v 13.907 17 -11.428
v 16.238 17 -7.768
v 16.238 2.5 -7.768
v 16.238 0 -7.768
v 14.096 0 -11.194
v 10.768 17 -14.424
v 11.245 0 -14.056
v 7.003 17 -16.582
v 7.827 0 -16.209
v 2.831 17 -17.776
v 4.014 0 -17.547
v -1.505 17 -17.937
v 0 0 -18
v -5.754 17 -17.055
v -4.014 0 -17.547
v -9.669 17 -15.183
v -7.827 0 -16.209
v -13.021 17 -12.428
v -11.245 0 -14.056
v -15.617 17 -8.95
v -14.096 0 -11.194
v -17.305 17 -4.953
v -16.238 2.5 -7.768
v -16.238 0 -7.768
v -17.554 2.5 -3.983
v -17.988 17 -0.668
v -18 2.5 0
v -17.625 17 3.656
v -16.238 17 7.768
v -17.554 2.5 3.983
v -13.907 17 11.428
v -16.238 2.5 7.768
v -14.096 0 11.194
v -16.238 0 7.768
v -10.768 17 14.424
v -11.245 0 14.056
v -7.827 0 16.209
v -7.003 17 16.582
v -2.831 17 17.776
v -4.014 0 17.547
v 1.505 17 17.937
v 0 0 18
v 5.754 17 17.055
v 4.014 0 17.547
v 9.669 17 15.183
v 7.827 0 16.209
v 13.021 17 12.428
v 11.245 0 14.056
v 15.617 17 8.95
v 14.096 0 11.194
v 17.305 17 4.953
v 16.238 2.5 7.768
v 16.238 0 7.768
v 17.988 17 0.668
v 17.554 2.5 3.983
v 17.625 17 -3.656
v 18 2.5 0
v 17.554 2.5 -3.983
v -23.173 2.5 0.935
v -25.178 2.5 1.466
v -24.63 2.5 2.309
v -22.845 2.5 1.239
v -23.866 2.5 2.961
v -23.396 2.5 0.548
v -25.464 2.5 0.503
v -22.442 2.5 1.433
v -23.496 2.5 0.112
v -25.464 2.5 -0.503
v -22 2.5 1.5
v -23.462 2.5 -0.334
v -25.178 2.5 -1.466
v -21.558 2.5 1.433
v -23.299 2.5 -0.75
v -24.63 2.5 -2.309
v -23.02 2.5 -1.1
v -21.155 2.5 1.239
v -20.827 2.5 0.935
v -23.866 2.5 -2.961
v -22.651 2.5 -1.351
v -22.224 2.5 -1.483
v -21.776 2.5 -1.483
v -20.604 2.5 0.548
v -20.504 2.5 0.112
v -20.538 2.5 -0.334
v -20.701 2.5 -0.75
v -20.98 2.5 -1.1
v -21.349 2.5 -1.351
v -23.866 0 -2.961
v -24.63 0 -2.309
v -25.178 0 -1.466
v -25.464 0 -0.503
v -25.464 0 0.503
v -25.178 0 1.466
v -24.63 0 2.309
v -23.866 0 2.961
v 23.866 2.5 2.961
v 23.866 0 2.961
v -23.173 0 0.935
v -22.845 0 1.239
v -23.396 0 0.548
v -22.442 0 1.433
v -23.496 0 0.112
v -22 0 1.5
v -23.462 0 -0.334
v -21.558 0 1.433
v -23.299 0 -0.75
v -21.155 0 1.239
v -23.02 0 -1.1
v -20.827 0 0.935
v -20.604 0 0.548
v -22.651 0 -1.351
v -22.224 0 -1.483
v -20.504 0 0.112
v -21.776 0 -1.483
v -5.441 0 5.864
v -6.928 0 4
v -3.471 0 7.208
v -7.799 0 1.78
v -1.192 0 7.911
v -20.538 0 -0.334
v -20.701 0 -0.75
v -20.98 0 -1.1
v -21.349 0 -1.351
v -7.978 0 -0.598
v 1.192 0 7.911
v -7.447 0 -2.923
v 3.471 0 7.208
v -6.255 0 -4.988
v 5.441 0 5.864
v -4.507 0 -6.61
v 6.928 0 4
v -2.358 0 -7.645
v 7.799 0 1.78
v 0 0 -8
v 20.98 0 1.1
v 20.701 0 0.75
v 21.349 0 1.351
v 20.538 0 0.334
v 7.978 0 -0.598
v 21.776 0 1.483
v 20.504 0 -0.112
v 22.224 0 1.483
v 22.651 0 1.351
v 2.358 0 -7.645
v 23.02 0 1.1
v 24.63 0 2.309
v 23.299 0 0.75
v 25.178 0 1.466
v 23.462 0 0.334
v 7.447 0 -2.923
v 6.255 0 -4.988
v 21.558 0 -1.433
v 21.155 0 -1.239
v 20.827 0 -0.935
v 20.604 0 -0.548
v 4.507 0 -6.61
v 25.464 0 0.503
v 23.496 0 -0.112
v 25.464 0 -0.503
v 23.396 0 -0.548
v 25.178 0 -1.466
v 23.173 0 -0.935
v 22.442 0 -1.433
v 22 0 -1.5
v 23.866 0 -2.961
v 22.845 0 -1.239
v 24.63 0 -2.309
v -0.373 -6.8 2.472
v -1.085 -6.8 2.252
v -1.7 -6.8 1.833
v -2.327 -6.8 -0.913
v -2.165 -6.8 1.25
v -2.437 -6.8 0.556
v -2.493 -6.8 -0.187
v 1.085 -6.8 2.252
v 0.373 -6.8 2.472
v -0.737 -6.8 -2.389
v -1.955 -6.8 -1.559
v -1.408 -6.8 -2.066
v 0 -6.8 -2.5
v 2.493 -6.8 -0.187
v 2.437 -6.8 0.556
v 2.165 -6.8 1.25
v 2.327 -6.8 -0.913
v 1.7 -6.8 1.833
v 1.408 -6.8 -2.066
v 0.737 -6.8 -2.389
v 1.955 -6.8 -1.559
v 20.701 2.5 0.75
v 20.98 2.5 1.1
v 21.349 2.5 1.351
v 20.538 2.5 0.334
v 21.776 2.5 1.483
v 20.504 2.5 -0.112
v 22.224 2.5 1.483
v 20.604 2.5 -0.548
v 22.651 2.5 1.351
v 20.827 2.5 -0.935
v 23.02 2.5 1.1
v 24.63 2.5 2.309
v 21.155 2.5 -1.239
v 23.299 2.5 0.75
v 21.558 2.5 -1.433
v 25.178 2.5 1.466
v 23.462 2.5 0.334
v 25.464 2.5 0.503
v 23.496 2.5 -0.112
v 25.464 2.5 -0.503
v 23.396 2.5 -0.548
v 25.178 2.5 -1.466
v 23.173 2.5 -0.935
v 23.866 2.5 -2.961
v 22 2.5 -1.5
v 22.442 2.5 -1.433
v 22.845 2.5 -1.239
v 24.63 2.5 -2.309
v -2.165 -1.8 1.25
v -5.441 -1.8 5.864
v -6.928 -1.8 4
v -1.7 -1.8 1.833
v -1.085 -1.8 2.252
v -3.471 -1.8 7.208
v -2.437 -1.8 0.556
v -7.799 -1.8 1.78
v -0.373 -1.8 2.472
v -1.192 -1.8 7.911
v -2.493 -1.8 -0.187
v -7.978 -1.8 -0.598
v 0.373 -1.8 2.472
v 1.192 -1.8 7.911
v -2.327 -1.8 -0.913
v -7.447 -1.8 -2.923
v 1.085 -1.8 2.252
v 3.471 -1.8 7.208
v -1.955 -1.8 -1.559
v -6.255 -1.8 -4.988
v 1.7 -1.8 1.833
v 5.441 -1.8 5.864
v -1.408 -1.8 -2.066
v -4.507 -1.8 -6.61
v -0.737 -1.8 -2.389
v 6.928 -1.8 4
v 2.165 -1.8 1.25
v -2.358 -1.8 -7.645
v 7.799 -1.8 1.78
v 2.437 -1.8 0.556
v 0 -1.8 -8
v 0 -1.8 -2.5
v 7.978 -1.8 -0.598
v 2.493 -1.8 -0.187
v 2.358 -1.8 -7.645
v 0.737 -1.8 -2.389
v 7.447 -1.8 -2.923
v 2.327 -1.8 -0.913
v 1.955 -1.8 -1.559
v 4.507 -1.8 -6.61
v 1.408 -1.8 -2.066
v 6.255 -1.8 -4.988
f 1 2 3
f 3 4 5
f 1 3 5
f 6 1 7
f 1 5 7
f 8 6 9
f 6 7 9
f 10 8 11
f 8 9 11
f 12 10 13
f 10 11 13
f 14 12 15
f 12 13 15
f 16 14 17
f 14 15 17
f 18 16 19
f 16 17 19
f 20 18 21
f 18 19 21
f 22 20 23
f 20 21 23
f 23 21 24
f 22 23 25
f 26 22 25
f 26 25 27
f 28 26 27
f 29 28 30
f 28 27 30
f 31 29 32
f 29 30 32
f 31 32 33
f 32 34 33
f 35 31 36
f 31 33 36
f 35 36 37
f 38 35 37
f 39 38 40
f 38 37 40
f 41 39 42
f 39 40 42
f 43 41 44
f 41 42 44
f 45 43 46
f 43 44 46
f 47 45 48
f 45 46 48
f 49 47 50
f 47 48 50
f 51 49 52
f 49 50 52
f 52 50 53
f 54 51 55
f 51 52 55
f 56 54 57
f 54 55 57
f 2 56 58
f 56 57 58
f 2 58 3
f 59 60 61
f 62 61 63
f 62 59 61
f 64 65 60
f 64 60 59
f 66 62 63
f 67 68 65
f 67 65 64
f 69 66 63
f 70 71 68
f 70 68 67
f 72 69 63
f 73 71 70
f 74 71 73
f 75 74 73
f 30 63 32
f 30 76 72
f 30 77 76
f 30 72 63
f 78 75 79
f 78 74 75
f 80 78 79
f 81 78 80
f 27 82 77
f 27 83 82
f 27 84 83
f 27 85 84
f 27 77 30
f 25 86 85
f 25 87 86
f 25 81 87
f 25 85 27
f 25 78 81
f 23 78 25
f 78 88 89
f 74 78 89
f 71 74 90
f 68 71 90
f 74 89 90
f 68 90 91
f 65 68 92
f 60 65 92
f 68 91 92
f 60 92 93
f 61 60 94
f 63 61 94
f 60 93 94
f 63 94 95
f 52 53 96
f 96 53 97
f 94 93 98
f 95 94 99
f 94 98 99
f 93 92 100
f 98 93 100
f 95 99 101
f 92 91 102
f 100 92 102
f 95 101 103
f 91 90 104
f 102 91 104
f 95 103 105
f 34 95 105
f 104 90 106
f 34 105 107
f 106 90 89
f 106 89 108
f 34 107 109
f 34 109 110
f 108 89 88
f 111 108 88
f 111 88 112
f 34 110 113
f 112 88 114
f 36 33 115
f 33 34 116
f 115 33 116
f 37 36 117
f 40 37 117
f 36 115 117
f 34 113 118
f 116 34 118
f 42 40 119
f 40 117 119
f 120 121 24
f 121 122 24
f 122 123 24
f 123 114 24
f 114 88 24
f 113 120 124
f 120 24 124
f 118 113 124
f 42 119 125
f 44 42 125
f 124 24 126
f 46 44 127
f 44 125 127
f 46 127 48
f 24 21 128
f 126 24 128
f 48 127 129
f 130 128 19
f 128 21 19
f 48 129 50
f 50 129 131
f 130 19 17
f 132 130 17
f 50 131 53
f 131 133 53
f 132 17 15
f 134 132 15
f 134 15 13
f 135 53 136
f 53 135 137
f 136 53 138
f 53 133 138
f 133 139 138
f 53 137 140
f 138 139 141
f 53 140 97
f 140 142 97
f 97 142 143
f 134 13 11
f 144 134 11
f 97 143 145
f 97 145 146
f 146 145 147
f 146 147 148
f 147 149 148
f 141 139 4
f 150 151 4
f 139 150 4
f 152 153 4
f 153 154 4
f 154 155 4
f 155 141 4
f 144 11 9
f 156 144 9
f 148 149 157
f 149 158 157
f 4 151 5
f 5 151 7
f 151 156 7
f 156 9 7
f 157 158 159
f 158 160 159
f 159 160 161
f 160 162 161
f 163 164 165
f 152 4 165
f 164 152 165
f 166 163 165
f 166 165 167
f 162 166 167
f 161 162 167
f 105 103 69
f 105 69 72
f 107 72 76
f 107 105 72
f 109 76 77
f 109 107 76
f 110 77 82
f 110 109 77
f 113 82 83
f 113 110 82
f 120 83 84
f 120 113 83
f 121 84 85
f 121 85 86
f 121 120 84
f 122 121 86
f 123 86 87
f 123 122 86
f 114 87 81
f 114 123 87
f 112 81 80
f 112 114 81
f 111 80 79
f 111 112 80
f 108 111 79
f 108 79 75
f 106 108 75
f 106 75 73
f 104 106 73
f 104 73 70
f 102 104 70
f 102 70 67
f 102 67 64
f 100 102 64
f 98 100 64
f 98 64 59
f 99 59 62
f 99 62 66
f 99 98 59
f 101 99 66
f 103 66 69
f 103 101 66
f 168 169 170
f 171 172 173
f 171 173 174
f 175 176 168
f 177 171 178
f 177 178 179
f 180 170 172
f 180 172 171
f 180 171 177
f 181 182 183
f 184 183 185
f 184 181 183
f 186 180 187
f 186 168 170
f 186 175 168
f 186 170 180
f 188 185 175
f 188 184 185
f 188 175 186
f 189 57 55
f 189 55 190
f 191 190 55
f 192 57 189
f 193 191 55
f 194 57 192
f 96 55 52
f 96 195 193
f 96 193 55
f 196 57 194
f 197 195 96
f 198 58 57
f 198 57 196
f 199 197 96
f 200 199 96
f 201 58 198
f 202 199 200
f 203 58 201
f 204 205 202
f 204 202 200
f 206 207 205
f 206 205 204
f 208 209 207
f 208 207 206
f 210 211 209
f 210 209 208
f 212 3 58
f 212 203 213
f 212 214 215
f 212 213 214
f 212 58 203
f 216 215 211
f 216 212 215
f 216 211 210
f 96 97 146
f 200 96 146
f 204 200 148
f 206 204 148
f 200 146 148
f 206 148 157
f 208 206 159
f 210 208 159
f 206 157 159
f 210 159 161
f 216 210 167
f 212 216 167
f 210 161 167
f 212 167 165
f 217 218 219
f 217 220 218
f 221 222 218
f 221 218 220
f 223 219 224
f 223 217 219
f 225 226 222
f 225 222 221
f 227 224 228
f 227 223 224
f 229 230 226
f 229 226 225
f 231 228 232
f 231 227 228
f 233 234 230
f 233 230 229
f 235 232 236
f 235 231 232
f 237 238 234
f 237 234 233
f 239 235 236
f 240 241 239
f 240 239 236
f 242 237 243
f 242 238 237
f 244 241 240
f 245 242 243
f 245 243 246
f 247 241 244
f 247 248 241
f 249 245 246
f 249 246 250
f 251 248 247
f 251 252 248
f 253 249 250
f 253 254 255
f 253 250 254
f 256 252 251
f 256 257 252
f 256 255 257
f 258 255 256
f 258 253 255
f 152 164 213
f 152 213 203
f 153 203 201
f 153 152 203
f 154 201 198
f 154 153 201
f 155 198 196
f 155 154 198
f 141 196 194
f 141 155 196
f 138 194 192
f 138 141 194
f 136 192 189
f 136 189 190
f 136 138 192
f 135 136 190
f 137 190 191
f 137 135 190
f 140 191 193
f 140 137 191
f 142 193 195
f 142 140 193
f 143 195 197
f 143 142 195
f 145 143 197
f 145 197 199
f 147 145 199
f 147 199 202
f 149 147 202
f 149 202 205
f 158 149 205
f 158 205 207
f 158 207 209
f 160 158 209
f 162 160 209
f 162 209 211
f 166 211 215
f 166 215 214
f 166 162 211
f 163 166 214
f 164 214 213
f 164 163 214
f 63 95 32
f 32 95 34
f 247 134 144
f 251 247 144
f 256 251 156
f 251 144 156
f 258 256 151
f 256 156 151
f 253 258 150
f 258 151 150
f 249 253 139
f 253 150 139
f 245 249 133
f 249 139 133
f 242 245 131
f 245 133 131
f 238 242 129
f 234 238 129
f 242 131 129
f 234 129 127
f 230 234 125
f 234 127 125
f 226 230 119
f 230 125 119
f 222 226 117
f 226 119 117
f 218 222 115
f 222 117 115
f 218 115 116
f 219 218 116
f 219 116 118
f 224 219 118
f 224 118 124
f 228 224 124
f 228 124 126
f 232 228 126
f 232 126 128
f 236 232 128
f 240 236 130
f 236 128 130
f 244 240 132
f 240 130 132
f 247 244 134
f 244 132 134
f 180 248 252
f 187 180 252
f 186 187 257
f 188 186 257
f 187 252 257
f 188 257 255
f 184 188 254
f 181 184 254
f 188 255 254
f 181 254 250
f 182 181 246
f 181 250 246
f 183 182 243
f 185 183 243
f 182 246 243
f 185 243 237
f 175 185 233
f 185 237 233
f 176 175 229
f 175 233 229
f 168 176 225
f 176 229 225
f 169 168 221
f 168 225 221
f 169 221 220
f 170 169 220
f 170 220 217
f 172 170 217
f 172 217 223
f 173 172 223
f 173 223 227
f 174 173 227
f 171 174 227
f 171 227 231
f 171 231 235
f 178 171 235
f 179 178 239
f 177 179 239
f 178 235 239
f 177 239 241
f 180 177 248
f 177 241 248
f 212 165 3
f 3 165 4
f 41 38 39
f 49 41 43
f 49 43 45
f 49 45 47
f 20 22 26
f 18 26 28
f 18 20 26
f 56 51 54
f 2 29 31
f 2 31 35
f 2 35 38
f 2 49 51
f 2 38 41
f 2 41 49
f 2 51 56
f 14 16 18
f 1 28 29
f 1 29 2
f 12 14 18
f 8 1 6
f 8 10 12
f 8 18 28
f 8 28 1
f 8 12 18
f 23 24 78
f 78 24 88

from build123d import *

# Parameters (mm, degrees)
SKETCH1_R           = 1.5
BOSS_EXTRUDE1_DEPTH = 2.5
BOSS_EXTRUDE2_START = -2.5
SKETCH2_R           = 18
BOSS_EXTRUDE2_DEPTH = 17
SKETCH3_R           = 8
BOSS_EXTRUDE3_DEPTH = 1.8
SKETCH4_R           = 2.5
BOSS_EXTRUDE4_DEPTH = 5


with BuildPart() as part:
    # Sketch1 → Boss-Extrude1 (new body)
    with BuildSketch(Plane(origin=(0, 0, 0), x_dir=(1, 0, 0), z_dir=(0, 1, 0))):
        with BuildLine():
            Line((-16.237503877, 7.768105807), (-23.86592771, 2.961133868))
            ThreePointArc((-23.86592771, 2.961133868), (-25.5, 0), (-23.86592771, -2.961133868))
            Line((-23.86592771, -2.961133868), (-16.237503877, -7.768105807))
            ThreePointArc((-16.237503877, -7.768105807), (0, -18), (16.237503877, -7.768105807))
            Line((16.237503877, -7.768105807), (23.86592771, -2.961133868))
            ThreePointArc((23.86592771, -2.961133868), (25.5, 0), (23.86592771, 2.961133868))
            Line((23.86592771, 2.961133868), (16.237503877, 7.768105807))
            ThreePointArc((16.237503877, 7.768105807), (0, 18), (-16.237503877, 7.768105807))
        make_face()
        with Locations(Location((-22, 0, 0), (0, 0, 270))):
            Circle(SKETCH1_R, mode=Mode.SUBTRACT)
        with Locations(Location((22, 0, 0), (0, 0, 90))):
            Circle(SKETCH1_R, mode=Mode.SUBTRACT)
    extrude(amount=BOSS_EXTRUDE1_DEPTH)

    # Sketch2 → Boss-Extrude2 (add)
    with BuildSketch(Plane(origin=(0, 2.5, 0), x_dir=(1, 0, 0), z_dir=(0, 1, 0)).offset(BOSS_EXTRUDE2_START)):
        with Locations(Location((0, 0, 0), (0, 0, 25.566693529))):
            Circle(SKETCH2_R)
    extrude(amount=BOSS_EXTRUDE2_DEPTH)

    # Sketch3 → Boss-Extrude3 (add)
    with BuildSketch(Plane.XZ):
        with Locations(Location((0, 0, 0), (0, 0, 270))):
            Circle(SKETCH3_R)
    extrude(amount=BOSS_EXTRUDE3_DEPTH)

    # Sketch4 → Boss-Extrude4 (add)
    with BuildSketch(Plane.XZ.offset(1.8)):
        with Locations(Location((0, 0, 0), (0, 0, 270))):
            Circle(SKETCH4_R)
    extrude(amount=BOSS_EXTRUDE4_DEPTH)


solid = part.part
